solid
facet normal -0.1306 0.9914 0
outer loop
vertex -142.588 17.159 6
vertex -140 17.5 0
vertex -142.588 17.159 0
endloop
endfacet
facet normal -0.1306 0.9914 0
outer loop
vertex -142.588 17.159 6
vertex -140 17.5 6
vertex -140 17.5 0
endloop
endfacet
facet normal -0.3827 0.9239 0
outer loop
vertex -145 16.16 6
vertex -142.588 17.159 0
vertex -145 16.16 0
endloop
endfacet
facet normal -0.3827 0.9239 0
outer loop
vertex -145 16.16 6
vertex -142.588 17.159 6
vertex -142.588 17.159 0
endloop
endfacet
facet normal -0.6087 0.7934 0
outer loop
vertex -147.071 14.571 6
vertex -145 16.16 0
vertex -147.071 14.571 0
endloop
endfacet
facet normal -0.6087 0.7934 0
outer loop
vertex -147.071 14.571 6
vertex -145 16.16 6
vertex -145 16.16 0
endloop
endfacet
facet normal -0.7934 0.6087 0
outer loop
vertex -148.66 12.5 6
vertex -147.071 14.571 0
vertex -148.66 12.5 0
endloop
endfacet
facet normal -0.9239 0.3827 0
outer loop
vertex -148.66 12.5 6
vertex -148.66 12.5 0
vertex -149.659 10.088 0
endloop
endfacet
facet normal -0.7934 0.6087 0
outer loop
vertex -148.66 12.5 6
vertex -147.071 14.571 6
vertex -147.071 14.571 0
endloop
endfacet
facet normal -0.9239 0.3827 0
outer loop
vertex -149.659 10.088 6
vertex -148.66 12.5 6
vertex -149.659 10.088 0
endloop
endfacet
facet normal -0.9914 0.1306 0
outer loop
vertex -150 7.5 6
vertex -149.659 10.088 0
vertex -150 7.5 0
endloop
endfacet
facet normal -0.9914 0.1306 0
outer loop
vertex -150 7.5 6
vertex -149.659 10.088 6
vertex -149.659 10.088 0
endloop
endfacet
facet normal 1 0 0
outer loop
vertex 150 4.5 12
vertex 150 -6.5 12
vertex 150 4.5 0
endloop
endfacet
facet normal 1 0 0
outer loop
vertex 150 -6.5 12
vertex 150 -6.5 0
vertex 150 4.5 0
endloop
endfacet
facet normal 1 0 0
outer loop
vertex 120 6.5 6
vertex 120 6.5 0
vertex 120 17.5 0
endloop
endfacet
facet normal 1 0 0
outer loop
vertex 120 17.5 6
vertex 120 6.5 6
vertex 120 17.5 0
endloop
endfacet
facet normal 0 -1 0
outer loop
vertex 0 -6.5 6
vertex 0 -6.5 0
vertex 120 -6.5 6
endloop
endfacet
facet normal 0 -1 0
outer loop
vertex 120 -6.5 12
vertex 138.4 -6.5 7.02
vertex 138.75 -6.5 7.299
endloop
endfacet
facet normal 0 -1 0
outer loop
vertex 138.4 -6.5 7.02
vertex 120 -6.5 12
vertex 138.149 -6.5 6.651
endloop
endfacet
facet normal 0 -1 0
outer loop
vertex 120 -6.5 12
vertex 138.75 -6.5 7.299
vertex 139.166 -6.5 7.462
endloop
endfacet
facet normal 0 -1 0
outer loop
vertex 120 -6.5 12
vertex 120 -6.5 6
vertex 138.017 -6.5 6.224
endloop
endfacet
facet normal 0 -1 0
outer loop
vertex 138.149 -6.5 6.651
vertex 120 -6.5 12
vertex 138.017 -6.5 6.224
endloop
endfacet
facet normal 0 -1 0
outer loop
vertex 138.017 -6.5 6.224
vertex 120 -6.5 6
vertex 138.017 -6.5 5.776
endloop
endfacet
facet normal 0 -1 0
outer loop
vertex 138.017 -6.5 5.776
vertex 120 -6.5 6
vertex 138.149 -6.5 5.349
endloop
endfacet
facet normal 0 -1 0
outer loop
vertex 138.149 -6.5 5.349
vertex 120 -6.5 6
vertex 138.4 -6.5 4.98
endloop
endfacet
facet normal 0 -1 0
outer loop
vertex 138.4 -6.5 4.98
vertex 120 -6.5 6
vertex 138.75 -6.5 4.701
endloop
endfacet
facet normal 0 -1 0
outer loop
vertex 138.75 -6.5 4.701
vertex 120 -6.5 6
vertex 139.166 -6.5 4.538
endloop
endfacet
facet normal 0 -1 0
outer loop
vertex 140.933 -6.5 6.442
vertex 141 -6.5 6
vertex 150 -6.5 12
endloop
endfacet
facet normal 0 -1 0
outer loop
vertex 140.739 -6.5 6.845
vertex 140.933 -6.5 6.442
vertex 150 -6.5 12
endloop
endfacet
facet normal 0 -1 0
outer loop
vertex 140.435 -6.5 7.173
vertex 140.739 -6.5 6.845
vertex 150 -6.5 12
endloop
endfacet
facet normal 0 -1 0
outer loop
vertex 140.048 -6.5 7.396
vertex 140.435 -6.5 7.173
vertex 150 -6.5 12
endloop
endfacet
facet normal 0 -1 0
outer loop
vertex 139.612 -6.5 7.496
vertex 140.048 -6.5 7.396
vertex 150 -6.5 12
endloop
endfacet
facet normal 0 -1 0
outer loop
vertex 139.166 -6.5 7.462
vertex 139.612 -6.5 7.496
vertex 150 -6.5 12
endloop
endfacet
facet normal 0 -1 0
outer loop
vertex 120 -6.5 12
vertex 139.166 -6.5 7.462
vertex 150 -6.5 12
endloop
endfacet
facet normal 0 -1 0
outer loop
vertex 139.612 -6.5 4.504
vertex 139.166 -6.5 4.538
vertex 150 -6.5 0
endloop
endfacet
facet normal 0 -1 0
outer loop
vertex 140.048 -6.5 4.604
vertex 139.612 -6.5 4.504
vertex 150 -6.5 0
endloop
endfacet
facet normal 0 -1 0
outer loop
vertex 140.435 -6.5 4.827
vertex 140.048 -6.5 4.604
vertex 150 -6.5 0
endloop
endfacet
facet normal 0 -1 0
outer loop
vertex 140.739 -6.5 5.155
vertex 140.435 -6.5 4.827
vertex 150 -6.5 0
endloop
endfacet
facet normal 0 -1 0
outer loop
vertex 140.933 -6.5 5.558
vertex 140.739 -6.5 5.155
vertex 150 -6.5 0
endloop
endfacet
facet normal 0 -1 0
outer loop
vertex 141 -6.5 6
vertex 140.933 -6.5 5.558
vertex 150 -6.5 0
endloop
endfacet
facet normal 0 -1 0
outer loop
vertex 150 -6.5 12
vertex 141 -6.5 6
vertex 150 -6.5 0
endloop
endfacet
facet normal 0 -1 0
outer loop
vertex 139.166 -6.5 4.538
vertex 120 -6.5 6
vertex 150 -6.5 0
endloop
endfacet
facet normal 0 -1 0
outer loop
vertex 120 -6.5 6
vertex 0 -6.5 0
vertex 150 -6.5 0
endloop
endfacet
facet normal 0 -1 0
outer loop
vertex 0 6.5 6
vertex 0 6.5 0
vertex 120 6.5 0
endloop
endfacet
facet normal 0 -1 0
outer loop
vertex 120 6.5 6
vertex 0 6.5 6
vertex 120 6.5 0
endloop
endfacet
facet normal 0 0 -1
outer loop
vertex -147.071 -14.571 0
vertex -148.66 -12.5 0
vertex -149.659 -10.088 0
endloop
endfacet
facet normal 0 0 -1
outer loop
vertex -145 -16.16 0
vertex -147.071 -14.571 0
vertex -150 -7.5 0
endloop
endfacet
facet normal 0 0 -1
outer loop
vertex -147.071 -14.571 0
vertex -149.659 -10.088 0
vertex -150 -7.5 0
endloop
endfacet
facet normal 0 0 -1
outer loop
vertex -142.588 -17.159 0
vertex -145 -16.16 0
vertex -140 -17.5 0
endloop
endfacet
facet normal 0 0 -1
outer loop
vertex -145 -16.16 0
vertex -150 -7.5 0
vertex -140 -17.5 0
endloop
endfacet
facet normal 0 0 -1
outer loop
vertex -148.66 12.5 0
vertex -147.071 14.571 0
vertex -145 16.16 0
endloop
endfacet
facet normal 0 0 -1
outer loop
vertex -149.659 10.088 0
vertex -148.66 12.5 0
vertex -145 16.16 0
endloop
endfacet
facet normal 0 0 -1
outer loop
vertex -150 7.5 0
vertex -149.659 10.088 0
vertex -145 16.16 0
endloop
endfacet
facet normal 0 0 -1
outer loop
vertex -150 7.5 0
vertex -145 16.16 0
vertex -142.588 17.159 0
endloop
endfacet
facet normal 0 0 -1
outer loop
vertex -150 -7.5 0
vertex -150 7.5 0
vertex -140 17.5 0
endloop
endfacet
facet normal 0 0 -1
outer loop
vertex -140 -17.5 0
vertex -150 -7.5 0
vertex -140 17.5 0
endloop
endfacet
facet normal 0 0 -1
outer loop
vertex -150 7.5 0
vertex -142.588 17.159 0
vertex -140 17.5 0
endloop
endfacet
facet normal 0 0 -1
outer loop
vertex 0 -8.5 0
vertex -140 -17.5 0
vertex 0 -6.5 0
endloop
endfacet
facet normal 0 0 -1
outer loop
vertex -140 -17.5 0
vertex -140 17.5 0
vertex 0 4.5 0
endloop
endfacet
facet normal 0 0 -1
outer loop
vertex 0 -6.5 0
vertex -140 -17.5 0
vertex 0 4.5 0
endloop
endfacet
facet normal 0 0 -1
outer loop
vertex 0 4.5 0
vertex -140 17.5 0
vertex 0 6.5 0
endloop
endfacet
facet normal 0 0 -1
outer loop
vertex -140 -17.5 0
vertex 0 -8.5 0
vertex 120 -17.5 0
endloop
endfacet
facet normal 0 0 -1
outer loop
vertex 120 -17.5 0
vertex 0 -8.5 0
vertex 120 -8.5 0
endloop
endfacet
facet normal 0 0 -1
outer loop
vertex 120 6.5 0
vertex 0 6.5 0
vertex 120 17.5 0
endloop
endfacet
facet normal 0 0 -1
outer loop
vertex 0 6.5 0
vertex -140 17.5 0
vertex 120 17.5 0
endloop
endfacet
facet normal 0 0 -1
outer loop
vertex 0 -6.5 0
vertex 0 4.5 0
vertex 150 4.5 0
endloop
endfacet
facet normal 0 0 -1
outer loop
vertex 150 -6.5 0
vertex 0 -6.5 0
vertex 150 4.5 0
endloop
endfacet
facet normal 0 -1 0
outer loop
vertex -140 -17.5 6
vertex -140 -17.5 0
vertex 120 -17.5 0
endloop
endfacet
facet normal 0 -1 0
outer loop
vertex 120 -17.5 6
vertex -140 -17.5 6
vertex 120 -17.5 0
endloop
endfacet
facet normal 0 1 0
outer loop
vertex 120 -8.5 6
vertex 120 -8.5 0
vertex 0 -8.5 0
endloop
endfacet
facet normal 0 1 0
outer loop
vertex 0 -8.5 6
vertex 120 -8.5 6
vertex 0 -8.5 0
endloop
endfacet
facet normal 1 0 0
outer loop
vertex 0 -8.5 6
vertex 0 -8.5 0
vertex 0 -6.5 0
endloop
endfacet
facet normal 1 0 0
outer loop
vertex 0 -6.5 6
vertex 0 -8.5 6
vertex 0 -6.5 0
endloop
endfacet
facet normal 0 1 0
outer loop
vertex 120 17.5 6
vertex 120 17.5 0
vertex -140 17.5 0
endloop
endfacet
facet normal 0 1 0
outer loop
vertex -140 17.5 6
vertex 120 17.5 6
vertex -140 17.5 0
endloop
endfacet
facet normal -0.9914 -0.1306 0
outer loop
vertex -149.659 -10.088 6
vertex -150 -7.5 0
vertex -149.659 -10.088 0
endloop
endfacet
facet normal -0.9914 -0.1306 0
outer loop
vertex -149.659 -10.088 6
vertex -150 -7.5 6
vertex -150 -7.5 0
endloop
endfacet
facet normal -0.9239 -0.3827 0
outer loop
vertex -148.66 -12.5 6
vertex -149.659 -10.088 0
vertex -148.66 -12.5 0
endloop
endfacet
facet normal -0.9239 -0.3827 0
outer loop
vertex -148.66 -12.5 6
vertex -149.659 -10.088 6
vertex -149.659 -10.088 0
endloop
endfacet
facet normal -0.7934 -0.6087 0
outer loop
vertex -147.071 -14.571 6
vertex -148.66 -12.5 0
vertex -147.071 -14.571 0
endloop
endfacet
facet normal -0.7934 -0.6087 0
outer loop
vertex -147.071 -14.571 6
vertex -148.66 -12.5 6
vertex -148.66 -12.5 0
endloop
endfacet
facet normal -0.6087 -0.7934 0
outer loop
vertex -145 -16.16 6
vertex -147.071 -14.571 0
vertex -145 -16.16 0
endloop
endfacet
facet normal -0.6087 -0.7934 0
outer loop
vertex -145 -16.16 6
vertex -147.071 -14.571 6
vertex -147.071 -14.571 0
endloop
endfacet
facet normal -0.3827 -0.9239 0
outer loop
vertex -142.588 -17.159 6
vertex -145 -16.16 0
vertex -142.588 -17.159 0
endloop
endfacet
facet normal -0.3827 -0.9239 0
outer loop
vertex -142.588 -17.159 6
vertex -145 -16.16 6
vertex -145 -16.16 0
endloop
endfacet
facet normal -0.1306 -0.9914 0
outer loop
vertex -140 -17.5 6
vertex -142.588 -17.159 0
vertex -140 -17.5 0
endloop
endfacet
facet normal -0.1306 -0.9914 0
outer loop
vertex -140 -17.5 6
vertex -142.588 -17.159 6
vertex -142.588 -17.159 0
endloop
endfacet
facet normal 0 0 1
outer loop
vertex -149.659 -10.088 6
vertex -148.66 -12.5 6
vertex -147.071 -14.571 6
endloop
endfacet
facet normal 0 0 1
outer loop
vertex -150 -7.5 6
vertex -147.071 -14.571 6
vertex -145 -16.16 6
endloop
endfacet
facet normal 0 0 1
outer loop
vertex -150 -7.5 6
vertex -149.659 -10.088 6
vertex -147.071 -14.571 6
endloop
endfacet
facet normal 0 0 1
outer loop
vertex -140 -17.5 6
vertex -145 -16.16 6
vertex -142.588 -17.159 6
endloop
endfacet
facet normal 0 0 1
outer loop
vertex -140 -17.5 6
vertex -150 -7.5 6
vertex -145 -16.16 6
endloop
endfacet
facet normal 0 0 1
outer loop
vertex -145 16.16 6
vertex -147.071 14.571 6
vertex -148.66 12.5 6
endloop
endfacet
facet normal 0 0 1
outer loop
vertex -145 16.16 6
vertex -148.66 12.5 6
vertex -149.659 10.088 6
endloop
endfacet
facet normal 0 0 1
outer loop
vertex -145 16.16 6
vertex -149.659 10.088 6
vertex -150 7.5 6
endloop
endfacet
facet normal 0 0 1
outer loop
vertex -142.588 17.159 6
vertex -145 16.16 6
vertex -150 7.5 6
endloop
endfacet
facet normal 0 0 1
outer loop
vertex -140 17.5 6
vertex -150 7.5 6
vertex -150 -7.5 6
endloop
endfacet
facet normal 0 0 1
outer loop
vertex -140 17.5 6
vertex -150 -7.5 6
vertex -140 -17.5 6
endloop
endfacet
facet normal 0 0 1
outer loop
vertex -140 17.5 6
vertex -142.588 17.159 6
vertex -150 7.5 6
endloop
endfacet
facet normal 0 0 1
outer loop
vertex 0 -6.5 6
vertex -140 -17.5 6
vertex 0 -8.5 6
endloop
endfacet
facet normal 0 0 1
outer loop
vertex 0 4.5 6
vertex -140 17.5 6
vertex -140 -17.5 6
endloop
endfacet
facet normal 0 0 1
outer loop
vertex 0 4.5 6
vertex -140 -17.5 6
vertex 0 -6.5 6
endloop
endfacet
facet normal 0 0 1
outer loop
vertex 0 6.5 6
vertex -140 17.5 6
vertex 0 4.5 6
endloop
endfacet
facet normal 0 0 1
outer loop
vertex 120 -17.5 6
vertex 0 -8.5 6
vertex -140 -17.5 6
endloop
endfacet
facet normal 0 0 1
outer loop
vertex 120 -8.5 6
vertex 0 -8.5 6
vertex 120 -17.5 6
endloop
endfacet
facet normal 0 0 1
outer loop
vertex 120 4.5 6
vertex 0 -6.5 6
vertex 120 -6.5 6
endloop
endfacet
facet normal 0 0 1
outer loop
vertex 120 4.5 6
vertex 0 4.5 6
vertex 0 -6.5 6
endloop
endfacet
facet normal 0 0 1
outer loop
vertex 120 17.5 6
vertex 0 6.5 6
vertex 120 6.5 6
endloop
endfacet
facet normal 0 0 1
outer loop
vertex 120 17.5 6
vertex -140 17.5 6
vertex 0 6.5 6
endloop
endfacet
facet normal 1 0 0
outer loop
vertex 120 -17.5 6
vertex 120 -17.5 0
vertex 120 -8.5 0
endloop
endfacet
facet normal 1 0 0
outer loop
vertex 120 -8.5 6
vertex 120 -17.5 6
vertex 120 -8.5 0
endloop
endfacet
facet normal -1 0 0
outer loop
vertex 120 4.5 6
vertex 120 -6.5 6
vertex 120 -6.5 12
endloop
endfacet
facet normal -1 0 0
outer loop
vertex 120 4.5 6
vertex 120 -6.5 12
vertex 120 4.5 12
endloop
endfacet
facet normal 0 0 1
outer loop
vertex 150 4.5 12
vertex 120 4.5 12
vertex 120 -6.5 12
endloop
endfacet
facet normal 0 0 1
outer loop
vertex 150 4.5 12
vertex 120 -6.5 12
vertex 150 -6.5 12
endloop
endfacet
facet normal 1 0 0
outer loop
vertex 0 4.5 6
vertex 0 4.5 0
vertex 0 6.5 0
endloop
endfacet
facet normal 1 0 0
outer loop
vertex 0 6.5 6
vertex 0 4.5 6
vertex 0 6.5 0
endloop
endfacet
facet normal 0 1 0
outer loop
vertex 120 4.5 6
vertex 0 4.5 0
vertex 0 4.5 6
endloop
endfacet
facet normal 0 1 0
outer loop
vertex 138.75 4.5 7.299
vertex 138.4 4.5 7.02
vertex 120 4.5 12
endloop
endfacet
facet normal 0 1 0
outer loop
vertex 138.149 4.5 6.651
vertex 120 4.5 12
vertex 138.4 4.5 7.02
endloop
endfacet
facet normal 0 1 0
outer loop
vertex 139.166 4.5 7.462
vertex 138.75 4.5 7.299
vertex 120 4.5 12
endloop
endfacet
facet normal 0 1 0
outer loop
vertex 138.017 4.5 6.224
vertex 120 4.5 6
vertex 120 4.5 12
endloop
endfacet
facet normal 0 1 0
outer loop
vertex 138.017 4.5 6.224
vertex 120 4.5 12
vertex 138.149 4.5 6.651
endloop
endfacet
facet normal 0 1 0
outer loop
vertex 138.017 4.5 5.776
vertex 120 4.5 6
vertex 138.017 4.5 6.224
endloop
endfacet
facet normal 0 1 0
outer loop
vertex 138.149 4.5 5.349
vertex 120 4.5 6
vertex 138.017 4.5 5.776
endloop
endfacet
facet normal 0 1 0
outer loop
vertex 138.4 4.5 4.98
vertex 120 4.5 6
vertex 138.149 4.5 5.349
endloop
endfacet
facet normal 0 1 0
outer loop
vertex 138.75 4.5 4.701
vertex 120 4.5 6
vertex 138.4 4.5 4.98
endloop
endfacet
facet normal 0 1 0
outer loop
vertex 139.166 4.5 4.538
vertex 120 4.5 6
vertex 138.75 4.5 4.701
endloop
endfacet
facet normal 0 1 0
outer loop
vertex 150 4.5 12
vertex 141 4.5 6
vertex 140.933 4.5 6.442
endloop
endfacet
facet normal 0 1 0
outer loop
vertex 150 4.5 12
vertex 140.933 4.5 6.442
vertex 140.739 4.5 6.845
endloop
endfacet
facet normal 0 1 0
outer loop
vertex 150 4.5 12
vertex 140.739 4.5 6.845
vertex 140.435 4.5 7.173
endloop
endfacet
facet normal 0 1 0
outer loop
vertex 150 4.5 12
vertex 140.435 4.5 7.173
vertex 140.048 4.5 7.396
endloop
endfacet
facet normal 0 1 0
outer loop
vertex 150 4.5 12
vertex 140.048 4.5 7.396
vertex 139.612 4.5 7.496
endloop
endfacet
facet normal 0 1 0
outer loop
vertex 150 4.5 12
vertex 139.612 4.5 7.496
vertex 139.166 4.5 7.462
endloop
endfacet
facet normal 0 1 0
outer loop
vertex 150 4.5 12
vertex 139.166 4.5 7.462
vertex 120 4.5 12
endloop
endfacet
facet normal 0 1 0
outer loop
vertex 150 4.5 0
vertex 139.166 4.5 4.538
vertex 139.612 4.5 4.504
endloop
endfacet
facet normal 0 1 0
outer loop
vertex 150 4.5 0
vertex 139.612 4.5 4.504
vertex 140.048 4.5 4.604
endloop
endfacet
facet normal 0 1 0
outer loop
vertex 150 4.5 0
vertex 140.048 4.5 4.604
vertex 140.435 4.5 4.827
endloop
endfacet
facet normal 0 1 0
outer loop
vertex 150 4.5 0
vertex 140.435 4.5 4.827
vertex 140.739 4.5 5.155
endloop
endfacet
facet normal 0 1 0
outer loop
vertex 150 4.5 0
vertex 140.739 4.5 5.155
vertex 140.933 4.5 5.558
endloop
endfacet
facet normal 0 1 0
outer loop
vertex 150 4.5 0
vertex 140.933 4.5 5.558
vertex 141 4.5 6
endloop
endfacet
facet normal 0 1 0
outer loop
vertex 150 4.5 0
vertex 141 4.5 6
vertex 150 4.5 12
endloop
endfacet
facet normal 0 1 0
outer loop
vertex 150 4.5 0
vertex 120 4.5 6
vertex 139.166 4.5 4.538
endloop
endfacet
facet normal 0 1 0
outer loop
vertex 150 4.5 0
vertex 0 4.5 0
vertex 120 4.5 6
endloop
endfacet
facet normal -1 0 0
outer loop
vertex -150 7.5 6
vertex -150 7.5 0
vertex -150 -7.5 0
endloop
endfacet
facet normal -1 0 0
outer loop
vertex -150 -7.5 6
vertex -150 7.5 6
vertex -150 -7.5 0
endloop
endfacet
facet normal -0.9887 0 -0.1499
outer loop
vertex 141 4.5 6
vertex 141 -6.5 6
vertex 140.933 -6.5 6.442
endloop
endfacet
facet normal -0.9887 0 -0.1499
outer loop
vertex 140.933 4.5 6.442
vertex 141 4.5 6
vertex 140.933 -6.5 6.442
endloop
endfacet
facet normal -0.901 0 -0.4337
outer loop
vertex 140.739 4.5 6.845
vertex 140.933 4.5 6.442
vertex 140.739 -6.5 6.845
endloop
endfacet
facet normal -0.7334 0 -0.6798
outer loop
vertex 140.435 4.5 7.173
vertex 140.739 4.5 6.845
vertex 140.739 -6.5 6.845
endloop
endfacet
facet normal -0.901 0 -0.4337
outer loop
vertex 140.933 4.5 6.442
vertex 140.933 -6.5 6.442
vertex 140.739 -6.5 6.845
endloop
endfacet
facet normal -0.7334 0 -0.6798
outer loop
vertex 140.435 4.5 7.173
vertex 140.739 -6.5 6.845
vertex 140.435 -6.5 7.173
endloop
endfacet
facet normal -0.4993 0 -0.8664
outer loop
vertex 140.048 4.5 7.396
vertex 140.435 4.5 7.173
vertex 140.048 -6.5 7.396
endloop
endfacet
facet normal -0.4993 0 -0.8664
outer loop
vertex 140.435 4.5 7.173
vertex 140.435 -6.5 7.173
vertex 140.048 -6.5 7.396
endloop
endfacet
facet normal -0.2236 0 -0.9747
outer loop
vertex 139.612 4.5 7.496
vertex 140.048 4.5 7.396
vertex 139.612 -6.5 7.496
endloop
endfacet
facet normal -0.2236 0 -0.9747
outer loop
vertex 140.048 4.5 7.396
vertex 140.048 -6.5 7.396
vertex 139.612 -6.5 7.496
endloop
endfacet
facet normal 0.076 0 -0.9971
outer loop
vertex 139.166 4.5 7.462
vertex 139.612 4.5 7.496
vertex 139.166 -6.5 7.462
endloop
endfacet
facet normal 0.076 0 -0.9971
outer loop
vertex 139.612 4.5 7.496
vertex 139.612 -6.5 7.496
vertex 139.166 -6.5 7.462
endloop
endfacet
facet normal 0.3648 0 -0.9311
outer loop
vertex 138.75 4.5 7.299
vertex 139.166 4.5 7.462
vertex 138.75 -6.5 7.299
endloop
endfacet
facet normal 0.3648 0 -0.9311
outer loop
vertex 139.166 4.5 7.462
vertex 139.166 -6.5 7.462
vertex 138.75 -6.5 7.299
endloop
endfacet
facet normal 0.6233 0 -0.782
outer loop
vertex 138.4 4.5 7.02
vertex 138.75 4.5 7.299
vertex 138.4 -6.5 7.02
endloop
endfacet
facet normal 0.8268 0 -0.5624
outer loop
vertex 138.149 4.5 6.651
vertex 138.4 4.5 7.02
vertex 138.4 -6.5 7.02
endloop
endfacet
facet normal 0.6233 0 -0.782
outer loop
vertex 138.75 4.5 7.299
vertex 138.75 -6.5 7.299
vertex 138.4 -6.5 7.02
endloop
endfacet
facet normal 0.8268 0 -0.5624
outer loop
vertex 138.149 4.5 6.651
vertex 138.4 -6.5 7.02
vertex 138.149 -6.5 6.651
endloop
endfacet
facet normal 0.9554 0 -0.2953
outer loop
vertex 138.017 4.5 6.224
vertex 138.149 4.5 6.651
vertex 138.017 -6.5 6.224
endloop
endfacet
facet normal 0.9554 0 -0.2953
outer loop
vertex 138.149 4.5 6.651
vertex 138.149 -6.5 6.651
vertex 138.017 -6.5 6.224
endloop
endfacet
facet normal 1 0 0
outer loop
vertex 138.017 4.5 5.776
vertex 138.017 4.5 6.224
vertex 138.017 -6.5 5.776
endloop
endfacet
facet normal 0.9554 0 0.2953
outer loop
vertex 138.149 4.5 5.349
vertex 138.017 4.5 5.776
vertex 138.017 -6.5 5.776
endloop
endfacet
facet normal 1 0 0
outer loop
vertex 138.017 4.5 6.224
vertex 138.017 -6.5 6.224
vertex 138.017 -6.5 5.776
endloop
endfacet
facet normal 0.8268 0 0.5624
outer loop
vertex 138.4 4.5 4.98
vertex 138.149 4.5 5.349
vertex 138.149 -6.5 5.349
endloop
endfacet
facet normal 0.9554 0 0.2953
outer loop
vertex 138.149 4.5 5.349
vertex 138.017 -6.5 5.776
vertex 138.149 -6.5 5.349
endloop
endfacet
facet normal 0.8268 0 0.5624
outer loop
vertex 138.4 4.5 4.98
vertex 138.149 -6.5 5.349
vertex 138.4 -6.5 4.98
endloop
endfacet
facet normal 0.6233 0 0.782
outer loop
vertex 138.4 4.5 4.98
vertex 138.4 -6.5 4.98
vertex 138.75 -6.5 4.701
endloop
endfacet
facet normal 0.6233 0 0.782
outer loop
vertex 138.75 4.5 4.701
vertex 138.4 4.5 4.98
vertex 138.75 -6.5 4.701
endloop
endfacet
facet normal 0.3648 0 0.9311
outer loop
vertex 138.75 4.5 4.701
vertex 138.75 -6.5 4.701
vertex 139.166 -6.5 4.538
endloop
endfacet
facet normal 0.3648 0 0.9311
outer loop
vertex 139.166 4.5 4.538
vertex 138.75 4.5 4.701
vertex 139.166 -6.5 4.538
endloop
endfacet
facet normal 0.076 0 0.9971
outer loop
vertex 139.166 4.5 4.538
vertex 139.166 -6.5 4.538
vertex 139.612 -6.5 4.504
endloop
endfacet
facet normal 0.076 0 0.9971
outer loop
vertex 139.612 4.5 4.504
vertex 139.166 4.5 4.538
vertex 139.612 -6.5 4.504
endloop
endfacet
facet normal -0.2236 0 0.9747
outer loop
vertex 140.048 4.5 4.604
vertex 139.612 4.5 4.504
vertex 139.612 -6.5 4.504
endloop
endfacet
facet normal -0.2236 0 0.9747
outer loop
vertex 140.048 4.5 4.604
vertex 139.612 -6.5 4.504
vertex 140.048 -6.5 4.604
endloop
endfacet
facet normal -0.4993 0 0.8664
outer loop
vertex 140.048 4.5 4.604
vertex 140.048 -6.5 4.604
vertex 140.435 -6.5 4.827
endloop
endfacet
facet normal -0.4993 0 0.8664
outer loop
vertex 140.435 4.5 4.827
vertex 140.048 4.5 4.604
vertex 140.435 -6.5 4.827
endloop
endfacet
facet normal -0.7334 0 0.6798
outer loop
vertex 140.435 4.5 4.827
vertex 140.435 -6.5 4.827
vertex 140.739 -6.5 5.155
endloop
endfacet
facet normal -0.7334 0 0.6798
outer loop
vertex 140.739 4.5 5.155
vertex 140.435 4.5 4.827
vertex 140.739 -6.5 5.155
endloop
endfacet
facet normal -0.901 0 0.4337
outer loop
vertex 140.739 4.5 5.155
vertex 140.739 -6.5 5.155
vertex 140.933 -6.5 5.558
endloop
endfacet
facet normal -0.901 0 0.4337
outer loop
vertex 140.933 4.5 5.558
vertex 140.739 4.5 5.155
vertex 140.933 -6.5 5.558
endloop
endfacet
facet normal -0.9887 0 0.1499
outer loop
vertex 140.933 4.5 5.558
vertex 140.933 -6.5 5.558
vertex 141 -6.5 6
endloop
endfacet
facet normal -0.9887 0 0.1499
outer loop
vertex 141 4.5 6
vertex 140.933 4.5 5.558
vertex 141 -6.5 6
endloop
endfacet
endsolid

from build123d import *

# Parameters (mm, degrees)
F1_DEPTH = 6
F2_R     = 10
F3_W     = 30
F3_H     = 11
F4_DEPTH = 6
F5_R     = 1.5
F6_DEPTH = 25


with BuildPart() as f1:
    # F0 (on Top) → F1 (new body)
    with BuildSketch(Plane.XY):
        Polygon((120, 17.5), (-150, 17.5), (-150, -17.5), (120, -17.5), (120, -8.5), (0, -8.5), (0, -6.5), (150, -6.5), (150, 4.5), (0, 4.5), (0, 6.5), (120, 6.5), align=None)
    extrude(amount=F1_DEPTH)

    # F2
    f2_edges = [f1.edges().sort_by_distance(p)[0] for p in [
        (-150, -17.5, 3),
        (-150, 17.5, 3),
    ]]
    fillet(f2_edges, radius=F2_R)

    # F3 (on face) → F4 (join)
    with BuildSketch(Plane.XY.offset(6)):
        with Locations((135, -1)):
            Rectangle(F3_W, F3_H)
    extrude(amount=F4_DEPTH)

    # F5 (on face) → F6 (cut)
    with BuildSketch(Plane.XZ.offset(6.5)):
        with Locations((139.5, 6)):
            Circle(F5_R)
    extrude(amount=-F6_DEPTH, mode=Mode.SUBTRACT)


solid = f1.part
